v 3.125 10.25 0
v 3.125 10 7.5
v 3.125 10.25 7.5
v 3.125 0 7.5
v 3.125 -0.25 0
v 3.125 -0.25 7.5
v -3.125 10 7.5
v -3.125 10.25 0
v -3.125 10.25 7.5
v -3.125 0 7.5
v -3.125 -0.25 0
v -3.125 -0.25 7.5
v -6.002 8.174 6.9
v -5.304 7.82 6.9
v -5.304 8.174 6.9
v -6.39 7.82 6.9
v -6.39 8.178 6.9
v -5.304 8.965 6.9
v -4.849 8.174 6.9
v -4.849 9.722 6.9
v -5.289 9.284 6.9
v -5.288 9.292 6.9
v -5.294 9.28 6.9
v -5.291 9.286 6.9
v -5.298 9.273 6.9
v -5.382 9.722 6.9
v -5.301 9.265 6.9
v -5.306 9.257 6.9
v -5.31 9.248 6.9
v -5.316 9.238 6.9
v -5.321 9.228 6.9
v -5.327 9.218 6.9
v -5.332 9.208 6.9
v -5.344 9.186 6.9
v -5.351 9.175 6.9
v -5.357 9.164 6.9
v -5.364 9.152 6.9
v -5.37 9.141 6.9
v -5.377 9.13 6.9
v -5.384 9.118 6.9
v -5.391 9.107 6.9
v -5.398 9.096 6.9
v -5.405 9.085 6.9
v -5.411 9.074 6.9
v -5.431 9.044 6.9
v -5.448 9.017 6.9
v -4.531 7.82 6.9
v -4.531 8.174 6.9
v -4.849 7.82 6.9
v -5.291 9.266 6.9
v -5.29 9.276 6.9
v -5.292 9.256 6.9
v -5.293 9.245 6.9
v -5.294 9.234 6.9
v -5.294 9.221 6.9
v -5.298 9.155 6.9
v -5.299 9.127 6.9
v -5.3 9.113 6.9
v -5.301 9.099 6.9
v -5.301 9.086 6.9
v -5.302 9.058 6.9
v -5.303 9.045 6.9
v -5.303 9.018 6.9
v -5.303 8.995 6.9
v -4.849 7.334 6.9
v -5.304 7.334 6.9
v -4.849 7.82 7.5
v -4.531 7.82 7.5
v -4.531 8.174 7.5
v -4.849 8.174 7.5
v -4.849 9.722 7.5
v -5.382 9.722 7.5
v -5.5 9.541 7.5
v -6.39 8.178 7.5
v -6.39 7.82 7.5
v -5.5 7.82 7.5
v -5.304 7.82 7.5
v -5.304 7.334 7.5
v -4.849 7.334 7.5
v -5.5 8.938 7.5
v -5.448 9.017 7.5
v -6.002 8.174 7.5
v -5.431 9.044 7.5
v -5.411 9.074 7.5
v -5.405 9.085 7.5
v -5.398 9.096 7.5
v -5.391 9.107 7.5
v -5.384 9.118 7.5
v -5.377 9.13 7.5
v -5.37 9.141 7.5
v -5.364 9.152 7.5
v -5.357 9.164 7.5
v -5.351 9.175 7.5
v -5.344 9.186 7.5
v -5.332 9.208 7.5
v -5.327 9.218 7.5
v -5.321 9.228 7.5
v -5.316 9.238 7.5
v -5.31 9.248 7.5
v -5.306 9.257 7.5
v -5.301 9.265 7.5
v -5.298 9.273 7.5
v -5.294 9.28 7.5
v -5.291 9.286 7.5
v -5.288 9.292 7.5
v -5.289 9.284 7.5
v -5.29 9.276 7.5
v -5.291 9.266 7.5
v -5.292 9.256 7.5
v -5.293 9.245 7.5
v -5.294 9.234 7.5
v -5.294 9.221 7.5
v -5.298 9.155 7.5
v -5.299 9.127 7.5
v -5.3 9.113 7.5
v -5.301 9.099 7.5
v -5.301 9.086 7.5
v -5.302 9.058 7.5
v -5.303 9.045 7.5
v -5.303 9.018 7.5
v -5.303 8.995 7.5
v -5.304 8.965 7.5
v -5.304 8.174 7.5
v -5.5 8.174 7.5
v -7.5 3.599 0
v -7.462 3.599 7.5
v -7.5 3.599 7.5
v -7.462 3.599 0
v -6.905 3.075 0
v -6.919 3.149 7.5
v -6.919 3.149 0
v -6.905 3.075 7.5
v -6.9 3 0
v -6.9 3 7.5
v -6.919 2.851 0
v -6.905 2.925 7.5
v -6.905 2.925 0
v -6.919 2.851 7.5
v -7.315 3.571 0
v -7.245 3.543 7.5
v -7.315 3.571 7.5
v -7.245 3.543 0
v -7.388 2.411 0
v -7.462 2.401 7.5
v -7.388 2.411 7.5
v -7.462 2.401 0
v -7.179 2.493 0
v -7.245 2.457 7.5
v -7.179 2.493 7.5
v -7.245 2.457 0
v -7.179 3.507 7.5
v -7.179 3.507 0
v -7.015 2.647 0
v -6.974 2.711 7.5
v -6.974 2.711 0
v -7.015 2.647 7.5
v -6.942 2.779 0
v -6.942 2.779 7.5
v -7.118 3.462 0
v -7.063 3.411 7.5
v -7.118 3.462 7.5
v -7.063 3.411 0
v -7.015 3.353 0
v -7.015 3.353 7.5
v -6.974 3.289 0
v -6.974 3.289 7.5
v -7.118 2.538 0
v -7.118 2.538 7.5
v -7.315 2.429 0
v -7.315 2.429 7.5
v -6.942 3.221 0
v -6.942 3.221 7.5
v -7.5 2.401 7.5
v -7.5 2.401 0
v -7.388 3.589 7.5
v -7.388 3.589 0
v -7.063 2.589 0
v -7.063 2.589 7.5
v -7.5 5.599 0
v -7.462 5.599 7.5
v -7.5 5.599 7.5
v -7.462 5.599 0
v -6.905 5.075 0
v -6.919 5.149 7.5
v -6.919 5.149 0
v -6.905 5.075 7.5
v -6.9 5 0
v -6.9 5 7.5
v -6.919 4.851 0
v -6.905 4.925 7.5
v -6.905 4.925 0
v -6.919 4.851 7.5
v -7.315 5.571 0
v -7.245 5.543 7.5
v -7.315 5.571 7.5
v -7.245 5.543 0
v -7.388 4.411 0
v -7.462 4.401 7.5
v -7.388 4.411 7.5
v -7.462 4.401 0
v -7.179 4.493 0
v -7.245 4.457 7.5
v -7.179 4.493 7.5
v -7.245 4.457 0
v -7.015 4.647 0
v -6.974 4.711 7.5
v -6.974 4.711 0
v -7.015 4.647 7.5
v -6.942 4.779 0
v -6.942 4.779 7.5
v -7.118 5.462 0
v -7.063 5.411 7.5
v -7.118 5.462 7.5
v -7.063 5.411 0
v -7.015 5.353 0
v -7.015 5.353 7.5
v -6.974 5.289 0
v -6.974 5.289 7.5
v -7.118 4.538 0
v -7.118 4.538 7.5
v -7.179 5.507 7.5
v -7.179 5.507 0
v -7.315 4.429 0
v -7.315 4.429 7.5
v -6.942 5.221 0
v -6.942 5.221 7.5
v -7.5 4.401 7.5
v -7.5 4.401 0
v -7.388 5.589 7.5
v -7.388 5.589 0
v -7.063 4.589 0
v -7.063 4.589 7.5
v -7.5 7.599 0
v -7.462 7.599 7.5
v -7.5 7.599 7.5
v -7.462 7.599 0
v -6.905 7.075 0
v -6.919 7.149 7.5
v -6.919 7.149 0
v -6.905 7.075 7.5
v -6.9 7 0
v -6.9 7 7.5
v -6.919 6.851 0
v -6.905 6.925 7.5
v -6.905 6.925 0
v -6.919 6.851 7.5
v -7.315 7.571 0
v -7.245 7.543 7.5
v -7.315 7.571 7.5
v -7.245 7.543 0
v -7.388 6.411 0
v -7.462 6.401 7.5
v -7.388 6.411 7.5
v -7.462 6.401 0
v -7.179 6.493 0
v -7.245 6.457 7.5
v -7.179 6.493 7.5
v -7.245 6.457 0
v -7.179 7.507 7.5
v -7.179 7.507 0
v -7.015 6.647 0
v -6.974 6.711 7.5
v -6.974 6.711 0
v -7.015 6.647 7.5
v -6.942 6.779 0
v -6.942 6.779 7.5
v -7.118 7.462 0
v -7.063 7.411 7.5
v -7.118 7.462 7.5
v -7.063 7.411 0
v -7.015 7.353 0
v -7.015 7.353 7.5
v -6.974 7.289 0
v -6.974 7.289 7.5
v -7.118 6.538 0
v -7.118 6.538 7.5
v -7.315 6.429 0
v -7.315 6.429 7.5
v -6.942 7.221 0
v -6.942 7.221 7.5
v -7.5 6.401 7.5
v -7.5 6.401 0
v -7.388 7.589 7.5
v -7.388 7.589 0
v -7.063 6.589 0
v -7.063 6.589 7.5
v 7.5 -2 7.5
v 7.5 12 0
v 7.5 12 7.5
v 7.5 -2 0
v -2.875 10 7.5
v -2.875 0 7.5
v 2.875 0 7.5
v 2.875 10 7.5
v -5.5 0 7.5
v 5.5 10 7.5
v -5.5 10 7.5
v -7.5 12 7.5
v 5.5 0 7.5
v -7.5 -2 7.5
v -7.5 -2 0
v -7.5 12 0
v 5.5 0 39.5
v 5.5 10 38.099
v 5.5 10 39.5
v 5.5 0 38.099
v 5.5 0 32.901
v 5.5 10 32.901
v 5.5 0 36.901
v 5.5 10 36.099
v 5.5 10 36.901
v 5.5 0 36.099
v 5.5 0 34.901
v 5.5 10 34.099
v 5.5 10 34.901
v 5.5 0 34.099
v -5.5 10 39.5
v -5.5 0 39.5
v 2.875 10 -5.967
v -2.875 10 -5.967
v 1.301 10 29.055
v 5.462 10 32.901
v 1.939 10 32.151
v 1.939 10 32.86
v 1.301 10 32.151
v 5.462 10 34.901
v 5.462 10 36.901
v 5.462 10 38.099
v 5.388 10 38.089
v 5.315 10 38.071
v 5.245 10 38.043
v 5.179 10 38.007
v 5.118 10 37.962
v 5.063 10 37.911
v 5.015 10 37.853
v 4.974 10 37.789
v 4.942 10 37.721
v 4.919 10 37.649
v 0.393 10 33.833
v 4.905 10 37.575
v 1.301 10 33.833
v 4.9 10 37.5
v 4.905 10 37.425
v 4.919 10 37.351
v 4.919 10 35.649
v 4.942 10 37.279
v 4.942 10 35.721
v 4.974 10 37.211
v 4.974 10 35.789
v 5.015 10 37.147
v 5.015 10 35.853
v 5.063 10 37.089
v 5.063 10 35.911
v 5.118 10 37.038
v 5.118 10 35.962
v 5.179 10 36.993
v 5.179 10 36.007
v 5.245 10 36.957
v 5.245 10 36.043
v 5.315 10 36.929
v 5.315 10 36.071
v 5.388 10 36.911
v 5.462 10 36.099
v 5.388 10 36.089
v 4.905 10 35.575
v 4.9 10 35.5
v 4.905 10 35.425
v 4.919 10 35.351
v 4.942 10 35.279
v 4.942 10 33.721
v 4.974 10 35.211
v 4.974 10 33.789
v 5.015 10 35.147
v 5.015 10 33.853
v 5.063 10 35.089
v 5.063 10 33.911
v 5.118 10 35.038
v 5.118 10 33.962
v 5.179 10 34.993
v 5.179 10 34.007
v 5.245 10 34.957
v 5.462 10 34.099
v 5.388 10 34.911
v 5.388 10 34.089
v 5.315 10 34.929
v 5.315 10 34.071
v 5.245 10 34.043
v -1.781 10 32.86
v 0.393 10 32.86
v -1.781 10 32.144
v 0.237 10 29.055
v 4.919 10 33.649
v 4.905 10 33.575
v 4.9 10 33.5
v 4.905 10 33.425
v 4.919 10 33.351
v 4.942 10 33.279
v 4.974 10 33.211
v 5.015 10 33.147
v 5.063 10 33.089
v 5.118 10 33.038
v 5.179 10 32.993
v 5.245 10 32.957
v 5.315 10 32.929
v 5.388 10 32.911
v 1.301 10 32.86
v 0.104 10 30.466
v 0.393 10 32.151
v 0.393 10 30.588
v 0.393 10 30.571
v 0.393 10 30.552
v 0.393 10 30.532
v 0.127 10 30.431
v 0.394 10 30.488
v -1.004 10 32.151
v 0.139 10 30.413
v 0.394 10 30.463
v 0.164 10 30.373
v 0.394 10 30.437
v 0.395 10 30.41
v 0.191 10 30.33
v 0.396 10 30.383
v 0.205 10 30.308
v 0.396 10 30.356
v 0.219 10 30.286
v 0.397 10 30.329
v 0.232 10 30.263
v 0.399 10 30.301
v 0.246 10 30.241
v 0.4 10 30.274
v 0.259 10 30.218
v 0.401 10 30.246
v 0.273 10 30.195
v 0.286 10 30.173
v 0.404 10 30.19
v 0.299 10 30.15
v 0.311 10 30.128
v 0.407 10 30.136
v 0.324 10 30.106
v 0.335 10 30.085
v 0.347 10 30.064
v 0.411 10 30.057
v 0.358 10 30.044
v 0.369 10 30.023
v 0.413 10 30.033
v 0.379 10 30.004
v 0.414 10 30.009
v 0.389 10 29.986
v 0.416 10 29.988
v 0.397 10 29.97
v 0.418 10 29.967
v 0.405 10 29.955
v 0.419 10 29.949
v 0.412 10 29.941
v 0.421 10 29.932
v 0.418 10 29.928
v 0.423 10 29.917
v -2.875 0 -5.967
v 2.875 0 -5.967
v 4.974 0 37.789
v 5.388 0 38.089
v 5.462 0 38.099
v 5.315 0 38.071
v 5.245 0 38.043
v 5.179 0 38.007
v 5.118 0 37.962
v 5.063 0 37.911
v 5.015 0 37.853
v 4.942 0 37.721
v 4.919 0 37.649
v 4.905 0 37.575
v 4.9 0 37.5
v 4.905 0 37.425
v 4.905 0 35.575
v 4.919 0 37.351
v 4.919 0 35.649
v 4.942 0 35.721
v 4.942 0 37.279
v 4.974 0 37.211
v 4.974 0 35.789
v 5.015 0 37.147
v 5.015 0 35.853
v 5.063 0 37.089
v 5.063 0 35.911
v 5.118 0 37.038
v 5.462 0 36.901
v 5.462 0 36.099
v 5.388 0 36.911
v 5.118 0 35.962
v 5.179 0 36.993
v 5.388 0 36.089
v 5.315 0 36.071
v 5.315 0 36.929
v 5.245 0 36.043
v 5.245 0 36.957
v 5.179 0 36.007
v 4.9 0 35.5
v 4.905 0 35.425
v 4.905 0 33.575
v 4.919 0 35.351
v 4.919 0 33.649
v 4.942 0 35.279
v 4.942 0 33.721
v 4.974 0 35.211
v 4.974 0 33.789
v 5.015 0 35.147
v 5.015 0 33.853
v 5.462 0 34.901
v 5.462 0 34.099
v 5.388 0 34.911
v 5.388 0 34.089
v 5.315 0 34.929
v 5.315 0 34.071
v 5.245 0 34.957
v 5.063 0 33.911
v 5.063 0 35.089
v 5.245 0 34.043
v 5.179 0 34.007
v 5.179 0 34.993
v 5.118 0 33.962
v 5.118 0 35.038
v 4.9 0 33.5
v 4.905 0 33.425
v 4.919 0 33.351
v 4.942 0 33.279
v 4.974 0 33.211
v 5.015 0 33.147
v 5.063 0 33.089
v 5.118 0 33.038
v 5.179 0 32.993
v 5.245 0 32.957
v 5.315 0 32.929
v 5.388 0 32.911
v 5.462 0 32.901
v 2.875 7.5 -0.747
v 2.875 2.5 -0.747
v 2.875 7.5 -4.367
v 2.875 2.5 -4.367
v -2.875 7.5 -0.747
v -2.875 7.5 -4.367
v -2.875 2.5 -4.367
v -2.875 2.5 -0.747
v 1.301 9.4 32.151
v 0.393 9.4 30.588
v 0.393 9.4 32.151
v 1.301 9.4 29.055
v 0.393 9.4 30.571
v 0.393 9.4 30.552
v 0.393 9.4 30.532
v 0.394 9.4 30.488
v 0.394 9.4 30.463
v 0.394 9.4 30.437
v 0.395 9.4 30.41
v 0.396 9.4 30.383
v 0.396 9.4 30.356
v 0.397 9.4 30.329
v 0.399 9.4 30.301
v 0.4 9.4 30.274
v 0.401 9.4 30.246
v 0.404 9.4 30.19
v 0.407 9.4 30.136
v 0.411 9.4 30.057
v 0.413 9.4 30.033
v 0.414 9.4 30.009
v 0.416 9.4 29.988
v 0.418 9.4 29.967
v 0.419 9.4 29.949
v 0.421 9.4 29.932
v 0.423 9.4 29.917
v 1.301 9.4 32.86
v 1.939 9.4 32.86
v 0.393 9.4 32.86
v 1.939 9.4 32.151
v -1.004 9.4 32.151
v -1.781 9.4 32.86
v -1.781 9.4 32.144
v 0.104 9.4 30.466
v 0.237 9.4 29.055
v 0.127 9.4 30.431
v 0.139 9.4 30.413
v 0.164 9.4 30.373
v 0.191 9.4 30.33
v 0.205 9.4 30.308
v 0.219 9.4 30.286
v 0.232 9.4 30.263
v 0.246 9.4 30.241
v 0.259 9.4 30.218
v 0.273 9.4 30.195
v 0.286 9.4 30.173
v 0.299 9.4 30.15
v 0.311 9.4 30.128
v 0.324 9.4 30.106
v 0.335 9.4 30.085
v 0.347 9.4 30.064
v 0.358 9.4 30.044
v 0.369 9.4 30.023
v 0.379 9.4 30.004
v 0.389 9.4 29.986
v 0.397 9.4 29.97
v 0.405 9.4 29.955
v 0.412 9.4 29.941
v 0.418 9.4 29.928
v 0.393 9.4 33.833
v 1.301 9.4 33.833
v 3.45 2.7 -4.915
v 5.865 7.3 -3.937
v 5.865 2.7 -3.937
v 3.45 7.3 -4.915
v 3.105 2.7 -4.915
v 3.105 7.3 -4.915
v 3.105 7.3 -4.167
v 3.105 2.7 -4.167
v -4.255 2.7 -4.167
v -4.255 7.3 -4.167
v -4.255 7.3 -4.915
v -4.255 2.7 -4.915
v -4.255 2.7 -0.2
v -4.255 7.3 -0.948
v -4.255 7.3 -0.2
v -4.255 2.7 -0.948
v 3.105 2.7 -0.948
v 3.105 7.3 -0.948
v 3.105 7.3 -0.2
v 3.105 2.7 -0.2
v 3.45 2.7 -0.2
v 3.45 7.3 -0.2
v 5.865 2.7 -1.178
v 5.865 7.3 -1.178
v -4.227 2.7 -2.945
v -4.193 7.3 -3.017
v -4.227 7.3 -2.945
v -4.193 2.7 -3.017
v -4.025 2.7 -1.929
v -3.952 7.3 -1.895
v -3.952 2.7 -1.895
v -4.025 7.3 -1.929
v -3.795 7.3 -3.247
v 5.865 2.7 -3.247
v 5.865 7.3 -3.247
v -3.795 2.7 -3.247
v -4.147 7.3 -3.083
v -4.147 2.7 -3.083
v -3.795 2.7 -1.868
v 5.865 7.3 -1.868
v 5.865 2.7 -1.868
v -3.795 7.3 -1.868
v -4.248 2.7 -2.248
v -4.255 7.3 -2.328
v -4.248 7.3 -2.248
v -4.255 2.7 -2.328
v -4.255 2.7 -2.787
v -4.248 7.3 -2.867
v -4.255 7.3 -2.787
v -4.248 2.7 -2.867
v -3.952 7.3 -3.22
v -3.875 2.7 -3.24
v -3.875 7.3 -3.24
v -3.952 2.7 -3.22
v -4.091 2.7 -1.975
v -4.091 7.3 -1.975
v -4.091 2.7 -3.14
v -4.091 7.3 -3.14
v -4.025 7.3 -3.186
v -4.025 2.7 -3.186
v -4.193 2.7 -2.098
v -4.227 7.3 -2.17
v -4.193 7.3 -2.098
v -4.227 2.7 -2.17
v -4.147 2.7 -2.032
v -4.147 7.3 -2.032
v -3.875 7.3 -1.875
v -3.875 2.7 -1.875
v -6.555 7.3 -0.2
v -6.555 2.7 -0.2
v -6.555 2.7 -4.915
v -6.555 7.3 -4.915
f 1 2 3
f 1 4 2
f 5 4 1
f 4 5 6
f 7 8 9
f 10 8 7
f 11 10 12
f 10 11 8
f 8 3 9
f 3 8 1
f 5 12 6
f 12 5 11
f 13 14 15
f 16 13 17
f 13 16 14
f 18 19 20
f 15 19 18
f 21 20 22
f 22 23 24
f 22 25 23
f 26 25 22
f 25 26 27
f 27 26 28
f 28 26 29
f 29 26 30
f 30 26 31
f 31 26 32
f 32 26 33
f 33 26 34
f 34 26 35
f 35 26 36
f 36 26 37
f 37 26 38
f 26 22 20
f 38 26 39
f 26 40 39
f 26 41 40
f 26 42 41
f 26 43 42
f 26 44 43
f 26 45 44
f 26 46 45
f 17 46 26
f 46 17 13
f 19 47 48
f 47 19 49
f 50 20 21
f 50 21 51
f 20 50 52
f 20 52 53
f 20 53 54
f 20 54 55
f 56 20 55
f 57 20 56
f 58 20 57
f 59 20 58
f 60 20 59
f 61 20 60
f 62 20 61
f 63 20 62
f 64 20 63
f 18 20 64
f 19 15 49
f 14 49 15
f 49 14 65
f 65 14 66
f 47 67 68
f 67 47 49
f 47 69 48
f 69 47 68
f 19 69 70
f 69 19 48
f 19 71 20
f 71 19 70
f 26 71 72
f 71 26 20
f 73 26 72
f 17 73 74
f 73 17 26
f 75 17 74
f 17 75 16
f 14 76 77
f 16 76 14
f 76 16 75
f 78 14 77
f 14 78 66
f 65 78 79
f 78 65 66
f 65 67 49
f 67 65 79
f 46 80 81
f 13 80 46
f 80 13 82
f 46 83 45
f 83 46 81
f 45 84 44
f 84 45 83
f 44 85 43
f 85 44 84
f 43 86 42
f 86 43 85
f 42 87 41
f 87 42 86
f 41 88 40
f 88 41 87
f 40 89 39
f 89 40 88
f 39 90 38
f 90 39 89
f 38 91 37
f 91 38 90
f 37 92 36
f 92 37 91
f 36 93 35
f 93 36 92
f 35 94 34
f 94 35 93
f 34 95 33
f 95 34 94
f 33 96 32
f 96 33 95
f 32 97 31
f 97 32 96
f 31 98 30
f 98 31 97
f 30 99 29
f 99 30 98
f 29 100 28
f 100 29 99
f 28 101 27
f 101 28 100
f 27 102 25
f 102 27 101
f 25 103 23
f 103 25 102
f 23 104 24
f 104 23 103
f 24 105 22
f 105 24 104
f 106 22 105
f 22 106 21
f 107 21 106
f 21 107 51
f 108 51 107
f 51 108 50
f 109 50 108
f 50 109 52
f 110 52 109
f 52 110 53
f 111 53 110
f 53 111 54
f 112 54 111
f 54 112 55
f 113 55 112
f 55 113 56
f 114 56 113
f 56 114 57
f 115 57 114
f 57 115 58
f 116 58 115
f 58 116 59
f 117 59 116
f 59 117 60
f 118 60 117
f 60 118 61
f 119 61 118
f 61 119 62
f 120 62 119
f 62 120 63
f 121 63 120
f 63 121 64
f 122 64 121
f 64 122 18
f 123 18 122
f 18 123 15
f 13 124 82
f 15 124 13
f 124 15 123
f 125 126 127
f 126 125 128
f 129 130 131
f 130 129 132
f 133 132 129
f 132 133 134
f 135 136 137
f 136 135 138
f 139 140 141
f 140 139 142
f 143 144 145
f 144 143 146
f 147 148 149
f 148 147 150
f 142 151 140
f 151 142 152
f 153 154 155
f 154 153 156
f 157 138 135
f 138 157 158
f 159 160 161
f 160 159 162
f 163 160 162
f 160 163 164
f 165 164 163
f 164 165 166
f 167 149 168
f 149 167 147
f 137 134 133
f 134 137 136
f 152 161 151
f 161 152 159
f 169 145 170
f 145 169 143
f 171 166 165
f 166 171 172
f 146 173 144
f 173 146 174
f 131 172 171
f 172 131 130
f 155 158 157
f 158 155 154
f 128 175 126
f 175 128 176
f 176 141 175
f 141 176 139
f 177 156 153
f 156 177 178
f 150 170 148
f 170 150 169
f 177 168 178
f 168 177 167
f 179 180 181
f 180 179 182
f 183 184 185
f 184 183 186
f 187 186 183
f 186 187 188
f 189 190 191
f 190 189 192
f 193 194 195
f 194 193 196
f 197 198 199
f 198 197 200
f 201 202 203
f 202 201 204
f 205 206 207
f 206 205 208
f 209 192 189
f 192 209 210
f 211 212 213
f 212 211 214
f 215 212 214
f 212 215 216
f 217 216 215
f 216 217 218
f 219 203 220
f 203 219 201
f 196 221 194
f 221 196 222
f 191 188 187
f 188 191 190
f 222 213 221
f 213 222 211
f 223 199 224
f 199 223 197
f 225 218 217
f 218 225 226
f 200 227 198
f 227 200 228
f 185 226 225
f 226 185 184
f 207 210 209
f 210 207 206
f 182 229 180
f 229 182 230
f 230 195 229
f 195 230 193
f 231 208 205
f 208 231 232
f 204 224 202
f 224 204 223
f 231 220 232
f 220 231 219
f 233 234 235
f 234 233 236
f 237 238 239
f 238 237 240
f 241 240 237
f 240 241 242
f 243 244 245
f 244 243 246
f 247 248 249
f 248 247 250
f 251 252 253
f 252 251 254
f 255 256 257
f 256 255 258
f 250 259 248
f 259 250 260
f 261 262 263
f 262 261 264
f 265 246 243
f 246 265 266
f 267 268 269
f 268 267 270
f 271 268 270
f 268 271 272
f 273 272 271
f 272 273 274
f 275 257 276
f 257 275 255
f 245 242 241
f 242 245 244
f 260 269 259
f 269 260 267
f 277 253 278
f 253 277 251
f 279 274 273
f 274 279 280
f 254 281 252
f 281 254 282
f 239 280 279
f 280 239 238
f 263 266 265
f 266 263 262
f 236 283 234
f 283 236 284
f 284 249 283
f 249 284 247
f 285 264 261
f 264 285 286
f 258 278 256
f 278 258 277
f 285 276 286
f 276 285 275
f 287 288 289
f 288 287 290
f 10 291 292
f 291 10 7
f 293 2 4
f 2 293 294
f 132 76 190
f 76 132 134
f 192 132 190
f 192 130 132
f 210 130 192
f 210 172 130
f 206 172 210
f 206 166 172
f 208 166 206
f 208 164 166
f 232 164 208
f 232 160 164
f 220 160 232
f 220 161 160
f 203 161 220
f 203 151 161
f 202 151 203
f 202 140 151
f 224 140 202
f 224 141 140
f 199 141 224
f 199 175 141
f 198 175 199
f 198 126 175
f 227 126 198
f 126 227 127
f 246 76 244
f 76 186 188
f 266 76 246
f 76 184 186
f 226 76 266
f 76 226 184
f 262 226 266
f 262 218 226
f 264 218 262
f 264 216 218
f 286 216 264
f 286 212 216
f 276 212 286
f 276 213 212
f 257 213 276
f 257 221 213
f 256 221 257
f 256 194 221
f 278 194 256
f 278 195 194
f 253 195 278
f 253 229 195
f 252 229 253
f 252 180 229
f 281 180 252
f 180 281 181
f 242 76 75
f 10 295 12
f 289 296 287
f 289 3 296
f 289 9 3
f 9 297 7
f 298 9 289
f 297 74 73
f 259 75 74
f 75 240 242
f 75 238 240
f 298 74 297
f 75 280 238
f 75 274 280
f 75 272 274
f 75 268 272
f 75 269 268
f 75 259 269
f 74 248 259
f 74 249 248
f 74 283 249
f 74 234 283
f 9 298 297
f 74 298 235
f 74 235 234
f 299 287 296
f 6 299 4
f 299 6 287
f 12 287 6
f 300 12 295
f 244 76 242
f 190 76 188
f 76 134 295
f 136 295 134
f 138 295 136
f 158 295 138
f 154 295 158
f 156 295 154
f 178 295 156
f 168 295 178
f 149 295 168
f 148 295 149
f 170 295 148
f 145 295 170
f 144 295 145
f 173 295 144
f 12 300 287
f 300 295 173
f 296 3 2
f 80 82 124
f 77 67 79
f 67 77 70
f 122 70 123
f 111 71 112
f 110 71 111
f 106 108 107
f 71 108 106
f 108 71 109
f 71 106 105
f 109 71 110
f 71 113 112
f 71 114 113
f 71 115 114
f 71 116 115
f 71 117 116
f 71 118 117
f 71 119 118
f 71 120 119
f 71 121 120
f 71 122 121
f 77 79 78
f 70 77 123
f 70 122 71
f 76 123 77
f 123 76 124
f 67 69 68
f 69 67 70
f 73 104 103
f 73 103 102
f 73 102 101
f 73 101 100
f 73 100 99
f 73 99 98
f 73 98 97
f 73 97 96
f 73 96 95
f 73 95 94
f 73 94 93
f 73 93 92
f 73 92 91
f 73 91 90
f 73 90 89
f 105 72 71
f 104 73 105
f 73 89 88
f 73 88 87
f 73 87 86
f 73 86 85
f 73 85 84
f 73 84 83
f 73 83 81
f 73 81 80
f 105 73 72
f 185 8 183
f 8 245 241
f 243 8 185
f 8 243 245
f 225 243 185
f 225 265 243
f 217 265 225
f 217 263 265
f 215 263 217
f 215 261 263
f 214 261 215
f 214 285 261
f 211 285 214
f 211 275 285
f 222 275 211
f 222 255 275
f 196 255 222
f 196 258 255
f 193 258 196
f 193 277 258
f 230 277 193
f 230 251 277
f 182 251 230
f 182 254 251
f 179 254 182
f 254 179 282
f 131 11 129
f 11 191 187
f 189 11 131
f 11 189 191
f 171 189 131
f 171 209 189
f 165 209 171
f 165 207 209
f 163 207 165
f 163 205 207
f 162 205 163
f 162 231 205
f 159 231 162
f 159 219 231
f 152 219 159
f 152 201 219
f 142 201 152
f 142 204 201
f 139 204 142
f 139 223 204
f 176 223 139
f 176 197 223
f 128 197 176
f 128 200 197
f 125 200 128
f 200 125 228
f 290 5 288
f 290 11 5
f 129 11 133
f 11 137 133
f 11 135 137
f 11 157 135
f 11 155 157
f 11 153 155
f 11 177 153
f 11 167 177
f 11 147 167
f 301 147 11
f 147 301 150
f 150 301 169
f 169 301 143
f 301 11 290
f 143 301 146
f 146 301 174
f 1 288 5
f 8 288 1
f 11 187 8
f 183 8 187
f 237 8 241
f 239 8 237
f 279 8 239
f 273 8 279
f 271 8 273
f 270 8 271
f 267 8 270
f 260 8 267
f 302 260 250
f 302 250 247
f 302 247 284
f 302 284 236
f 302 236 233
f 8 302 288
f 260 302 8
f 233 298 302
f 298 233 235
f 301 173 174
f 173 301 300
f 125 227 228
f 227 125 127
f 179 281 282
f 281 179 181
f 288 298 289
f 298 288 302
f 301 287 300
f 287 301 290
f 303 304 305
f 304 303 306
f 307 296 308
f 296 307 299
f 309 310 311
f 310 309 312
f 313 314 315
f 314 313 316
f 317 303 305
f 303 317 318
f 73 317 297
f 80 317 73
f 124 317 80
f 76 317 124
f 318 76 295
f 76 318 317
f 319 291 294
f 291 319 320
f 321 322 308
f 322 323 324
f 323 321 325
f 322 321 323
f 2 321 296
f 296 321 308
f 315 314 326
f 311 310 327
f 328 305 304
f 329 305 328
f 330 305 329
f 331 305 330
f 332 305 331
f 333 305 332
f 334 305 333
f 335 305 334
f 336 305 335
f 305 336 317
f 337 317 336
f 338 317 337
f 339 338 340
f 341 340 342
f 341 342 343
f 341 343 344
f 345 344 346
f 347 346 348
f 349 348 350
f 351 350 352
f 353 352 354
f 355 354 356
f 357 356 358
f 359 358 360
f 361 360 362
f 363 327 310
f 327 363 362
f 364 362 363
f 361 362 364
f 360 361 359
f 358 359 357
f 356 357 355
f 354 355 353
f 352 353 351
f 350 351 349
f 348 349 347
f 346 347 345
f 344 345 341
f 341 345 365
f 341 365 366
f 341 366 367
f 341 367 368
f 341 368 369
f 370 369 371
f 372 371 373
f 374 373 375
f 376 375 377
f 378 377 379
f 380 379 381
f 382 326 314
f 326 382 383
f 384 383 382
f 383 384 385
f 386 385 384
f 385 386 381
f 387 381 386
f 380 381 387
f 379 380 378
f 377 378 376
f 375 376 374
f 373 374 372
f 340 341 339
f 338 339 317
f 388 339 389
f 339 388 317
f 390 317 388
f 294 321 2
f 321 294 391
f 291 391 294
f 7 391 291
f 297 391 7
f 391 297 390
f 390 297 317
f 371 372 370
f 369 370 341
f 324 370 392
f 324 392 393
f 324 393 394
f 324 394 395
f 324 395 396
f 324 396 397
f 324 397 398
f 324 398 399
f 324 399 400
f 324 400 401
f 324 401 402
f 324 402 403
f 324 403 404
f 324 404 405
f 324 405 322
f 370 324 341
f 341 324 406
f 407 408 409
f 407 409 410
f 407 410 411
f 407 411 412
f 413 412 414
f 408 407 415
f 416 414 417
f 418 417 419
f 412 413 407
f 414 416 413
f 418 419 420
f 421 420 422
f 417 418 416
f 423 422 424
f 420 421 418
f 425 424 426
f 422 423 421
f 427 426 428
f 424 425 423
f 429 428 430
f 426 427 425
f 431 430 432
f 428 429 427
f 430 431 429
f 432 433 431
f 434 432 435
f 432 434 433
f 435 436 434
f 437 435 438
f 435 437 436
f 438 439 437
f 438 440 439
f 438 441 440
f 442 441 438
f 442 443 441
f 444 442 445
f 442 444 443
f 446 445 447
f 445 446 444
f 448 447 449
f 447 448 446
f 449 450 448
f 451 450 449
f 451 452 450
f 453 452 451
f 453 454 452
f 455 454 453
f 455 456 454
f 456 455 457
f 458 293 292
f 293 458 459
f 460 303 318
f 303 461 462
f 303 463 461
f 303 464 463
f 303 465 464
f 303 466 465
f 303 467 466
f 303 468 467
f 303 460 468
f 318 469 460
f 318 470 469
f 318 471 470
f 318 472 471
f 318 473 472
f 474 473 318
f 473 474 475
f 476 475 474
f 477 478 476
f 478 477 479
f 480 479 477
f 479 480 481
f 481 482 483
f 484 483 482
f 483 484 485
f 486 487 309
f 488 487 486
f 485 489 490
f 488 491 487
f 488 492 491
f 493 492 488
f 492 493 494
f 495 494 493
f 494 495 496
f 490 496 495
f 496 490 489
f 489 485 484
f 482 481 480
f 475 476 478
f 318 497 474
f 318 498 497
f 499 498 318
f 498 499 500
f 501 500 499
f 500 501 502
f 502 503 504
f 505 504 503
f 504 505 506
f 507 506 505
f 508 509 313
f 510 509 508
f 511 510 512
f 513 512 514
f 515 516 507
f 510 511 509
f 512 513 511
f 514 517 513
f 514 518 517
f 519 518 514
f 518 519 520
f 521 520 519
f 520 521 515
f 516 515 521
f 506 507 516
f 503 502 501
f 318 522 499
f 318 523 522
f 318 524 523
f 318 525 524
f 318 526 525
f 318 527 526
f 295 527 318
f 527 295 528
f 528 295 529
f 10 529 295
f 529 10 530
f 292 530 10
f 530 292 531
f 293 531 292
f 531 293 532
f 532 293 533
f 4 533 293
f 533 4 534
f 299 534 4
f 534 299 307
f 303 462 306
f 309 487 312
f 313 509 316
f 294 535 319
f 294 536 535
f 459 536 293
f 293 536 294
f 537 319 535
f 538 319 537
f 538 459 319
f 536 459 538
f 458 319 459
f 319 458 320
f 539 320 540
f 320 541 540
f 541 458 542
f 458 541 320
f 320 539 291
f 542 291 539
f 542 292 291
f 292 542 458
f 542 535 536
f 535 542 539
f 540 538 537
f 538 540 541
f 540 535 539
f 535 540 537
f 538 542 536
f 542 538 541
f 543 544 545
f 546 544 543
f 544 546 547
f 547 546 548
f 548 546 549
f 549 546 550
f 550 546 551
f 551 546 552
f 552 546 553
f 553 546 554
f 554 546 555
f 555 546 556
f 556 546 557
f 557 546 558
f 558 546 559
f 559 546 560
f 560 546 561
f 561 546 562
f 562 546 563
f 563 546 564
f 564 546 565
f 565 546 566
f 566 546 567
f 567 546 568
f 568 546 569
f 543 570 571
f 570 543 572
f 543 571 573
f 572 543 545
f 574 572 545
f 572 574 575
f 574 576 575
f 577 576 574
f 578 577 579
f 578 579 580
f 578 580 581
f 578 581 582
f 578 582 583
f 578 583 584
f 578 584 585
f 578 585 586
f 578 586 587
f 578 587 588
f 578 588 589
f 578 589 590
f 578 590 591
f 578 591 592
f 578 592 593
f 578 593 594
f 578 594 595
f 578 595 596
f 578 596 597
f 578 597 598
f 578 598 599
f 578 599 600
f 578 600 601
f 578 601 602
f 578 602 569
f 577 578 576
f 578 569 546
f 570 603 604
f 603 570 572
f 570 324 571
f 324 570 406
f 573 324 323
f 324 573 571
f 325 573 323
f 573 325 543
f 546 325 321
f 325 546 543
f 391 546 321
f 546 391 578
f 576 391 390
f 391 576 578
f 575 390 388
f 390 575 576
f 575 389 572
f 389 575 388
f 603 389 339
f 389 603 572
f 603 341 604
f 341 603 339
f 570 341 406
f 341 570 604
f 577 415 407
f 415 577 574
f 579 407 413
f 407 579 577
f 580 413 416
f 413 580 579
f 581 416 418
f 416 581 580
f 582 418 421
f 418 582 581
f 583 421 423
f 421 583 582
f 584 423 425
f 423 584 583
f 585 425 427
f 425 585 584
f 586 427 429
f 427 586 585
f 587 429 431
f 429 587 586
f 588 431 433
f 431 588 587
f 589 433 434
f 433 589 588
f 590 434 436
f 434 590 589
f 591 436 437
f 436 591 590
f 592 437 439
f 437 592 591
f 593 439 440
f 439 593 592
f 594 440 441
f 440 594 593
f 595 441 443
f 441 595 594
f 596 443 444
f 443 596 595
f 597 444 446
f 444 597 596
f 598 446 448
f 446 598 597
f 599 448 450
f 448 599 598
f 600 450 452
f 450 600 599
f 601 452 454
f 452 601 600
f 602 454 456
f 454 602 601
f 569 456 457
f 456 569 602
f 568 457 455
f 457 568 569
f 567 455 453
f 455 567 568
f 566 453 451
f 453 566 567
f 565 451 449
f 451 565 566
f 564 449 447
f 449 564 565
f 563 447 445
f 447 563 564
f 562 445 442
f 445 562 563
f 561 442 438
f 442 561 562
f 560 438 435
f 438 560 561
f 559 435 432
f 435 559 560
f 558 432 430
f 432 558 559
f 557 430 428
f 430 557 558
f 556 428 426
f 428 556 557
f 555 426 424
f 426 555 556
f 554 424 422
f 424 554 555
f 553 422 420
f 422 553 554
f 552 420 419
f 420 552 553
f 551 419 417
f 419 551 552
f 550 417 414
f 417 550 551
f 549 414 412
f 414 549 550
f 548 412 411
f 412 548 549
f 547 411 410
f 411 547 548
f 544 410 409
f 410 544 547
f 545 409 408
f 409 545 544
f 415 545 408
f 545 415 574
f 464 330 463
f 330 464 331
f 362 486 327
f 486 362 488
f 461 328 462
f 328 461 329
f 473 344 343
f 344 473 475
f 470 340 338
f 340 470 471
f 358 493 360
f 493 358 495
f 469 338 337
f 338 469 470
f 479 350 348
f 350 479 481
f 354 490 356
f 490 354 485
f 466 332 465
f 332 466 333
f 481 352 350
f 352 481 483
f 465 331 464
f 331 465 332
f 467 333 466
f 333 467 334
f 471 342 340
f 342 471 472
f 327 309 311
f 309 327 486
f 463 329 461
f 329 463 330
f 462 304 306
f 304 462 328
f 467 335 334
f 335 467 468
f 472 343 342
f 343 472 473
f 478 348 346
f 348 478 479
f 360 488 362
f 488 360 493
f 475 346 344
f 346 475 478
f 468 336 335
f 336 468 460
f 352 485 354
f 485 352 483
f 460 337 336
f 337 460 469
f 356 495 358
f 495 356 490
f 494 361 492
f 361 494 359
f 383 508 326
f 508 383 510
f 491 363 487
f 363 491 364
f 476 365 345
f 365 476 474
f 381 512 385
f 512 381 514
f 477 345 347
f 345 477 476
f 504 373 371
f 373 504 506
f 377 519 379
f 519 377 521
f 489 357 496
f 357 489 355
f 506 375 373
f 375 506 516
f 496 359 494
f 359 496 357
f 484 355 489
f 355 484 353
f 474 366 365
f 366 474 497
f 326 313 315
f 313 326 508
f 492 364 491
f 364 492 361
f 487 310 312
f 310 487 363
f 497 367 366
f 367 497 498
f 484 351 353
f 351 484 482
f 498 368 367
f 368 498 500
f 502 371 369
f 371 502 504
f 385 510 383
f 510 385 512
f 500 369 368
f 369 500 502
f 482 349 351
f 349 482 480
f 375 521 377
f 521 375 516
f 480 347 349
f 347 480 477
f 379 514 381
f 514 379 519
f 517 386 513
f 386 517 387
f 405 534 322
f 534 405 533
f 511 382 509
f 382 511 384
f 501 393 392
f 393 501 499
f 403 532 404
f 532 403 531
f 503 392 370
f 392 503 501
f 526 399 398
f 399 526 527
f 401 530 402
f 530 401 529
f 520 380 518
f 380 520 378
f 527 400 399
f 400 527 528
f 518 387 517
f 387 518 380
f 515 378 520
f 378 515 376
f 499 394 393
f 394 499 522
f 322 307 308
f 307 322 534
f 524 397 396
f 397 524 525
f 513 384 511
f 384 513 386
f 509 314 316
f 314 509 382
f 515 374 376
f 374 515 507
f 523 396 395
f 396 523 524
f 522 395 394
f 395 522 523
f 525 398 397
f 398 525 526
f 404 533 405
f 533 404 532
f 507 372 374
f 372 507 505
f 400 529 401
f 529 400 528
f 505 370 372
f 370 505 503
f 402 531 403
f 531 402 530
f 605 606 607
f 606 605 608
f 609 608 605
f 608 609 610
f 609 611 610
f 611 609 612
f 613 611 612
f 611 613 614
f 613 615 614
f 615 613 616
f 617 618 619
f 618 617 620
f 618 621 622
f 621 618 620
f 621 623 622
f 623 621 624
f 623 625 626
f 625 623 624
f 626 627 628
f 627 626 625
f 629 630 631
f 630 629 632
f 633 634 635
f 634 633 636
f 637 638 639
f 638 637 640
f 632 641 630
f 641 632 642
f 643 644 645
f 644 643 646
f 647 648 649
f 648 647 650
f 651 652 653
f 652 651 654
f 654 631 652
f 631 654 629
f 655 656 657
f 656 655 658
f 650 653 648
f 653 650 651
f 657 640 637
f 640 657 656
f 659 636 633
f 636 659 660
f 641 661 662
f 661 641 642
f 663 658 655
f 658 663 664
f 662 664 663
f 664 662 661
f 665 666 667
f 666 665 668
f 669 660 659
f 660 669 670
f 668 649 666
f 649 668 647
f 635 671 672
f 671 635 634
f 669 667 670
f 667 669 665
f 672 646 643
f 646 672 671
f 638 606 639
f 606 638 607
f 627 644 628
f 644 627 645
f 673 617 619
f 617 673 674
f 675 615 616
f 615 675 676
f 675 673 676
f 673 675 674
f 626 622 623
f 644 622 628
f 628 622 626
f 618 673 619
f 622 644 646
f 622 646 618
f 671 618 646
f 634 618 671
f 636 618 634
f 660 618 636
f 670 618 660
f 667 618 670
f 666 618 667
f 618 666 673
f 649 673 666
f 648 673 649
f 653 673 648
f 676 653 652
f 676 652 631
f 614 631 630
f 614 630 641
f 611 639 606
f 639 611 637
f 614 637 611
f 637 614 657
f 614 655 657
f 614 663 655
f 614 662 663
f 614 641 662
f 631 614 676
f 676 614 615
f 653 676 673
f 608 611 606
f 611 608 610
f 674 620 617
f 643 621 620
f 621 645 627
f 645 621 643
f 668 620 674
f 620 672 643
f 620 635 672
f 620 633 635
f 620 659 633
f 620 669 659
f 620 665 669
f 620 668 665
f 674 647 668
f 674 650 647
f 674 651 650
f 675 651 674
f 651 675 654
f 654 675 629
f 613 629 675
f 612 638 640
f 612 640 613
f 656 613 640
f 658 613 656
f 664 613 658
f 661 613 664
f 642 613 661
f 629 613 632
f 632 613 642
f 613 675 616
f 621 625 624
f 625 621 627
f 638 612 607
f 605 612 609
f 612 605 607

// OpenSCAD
$fn = 50;

difference() {
	union() {
		translate(v = [0, 0, 0]) {
			rotate(a = [0, 0, 0]) {
				difference() {
					union() {
						translate(v = [-7.5, -2.0, 0]) {
							cube(size = [15.0, 14.0, 7.5]);
						}
					}
					union() {
						translate(v = [-3.125, -0.25, -0.1]) {
							cube(size = [6.25, 10.5, 7.7]);
						}
						translate(v = [-5.5, 8.5, 6.9]) {
							linear_extrude(height = 0.7) {
								text(font = "Arial:style=Bold", halign = "center", size = 2.5, text = "4", valign = "center");
							}
						}
						translate(v = [-7.5, 3, -0.1]) {
							cylinder(h = 7.7, r = 0.6);
						}
						translate(v = [-7.5, 5, -0.1]) {
							cylinder(h = 7.7, r = 0.6);
						}
						translate(v = [-7.5, 7, -0.1]) {
							cylinder(h = 7.7, r = 0.6);
						}
					}
				}
			}
		}
		translate(v = [0, 0, 7.5]) {
			rotate(a = [0, 0, 0]) {
				difference() {
					union() {
						translate(v = [-5.5, 0, 0]) {
							cube(size = [11.0, 10.0, 32.0]);
						}
						translate(v = [-2.875, 0, -13.467499999999998]) {
							cube(size = [5.75, 10.0, 13.567499999999997]);
						}
					}
					union() {
						translate(v = [-2.975, 2.5, -11.867499999999998]) {
							cube(size = [5.95, 5.0, 3.62]);
						}
						translate(v = [0, 9.4, 24.0]) {
							rotate(a = [-90, 0, 0]) {
								linear_extrude(height = 0.7) {
									text(font = "Arial:style=Bold", halign = "center", size = 5.0, text = "4", valign = "center");
								}
							}
						}
						translate(v = [5.5, 10.1, 30.0]) {
							rotate(a = [90, 0, 0]) {
								cylinder(h = 10.2, r = 0.6);
							}
						}
						translate(v = [5.5, 10.1, 28.0]) {
							rotate(a = [90, 0, 0]) {
								cylinder(h = 10.2, r = 0.6);
							}
						}
						translate(v = [5.5, 10.1, 26.0]) {
							rotate(a = [90, 0, 0]) {
								cylinder(h = 10.2, r = 0.6);
							}
						}
					}
				}
			}
		}
		translate(v = [0, 2.7, -2.557499999999999]) {
			rotate(a = [0, 0, 0]) {
				difference() {
					union() {
						translate(v = [-6.555, 0, -2.3575]) {
							cube(size = [12.42, 4.6, 4.715]);
						}
					}
					union() {
						translate(v = [0, 4.699999999999999, 0]) {
							rotate(a = [90, 0, 0]) {
								linear_extrude(height = 4.8) {
									polygon(points = [[-4.255, -1.61], [3.105, -1.61], [3.105, -2.3575], [3.45, -2.3575], [5.865, -1.38], [5.965, -1.38], [5.965, -2.4575], [-4.255, -2.4575]]);
								}
							}
						}
						translate(v = [0, 4.699999999999999, 0]) {
							rotate(a = [90, 0, 0]) {
								linear_extrude(height = 4.8) {
									polygon(points = [[-4.255, 1.61], [3.105, 1.61], [3.105, 2.3575], [3.45, 2.3575], [5.865, 1.38], [5.965, 1.38], [5.965, 2.4575], [-4.255, 2.4575]]);
								}
							}
						}
						translate(v = [0, 4.699999999999999, 0]) {
							rotate(a = [90, 0, 0]) {
								linear_extrude(height = 4.8) {
									polygon(points = [[-4.255, 0.23], [-4.248012, 0.309878], [-4.227259, 0.387329], [-4.193372, 0.46], [-4.14738, 0.525682], [-4.090682, 0.58238], [-4.025, 0.628372], [-3.952329, 0.662259], [-3.874878, 0.683012], [-3.795, 0.69], [5.965, 0.69], [5.965, -0.69], [-3.795, -0.69], [-3.874878, -0.683012], [-3.952329, -0.662259], [-4.025, -0.628372], [-4.090682, -0.58238], [-4.14738, -0.525682], [-4.193372, -0.46], [-4.227259, -0.387329], [-4.248012, -0.309878], [-4.255, -0.23]]);
								}
							}
						}
					}
				}
			}
		}
	}
	union();
}
